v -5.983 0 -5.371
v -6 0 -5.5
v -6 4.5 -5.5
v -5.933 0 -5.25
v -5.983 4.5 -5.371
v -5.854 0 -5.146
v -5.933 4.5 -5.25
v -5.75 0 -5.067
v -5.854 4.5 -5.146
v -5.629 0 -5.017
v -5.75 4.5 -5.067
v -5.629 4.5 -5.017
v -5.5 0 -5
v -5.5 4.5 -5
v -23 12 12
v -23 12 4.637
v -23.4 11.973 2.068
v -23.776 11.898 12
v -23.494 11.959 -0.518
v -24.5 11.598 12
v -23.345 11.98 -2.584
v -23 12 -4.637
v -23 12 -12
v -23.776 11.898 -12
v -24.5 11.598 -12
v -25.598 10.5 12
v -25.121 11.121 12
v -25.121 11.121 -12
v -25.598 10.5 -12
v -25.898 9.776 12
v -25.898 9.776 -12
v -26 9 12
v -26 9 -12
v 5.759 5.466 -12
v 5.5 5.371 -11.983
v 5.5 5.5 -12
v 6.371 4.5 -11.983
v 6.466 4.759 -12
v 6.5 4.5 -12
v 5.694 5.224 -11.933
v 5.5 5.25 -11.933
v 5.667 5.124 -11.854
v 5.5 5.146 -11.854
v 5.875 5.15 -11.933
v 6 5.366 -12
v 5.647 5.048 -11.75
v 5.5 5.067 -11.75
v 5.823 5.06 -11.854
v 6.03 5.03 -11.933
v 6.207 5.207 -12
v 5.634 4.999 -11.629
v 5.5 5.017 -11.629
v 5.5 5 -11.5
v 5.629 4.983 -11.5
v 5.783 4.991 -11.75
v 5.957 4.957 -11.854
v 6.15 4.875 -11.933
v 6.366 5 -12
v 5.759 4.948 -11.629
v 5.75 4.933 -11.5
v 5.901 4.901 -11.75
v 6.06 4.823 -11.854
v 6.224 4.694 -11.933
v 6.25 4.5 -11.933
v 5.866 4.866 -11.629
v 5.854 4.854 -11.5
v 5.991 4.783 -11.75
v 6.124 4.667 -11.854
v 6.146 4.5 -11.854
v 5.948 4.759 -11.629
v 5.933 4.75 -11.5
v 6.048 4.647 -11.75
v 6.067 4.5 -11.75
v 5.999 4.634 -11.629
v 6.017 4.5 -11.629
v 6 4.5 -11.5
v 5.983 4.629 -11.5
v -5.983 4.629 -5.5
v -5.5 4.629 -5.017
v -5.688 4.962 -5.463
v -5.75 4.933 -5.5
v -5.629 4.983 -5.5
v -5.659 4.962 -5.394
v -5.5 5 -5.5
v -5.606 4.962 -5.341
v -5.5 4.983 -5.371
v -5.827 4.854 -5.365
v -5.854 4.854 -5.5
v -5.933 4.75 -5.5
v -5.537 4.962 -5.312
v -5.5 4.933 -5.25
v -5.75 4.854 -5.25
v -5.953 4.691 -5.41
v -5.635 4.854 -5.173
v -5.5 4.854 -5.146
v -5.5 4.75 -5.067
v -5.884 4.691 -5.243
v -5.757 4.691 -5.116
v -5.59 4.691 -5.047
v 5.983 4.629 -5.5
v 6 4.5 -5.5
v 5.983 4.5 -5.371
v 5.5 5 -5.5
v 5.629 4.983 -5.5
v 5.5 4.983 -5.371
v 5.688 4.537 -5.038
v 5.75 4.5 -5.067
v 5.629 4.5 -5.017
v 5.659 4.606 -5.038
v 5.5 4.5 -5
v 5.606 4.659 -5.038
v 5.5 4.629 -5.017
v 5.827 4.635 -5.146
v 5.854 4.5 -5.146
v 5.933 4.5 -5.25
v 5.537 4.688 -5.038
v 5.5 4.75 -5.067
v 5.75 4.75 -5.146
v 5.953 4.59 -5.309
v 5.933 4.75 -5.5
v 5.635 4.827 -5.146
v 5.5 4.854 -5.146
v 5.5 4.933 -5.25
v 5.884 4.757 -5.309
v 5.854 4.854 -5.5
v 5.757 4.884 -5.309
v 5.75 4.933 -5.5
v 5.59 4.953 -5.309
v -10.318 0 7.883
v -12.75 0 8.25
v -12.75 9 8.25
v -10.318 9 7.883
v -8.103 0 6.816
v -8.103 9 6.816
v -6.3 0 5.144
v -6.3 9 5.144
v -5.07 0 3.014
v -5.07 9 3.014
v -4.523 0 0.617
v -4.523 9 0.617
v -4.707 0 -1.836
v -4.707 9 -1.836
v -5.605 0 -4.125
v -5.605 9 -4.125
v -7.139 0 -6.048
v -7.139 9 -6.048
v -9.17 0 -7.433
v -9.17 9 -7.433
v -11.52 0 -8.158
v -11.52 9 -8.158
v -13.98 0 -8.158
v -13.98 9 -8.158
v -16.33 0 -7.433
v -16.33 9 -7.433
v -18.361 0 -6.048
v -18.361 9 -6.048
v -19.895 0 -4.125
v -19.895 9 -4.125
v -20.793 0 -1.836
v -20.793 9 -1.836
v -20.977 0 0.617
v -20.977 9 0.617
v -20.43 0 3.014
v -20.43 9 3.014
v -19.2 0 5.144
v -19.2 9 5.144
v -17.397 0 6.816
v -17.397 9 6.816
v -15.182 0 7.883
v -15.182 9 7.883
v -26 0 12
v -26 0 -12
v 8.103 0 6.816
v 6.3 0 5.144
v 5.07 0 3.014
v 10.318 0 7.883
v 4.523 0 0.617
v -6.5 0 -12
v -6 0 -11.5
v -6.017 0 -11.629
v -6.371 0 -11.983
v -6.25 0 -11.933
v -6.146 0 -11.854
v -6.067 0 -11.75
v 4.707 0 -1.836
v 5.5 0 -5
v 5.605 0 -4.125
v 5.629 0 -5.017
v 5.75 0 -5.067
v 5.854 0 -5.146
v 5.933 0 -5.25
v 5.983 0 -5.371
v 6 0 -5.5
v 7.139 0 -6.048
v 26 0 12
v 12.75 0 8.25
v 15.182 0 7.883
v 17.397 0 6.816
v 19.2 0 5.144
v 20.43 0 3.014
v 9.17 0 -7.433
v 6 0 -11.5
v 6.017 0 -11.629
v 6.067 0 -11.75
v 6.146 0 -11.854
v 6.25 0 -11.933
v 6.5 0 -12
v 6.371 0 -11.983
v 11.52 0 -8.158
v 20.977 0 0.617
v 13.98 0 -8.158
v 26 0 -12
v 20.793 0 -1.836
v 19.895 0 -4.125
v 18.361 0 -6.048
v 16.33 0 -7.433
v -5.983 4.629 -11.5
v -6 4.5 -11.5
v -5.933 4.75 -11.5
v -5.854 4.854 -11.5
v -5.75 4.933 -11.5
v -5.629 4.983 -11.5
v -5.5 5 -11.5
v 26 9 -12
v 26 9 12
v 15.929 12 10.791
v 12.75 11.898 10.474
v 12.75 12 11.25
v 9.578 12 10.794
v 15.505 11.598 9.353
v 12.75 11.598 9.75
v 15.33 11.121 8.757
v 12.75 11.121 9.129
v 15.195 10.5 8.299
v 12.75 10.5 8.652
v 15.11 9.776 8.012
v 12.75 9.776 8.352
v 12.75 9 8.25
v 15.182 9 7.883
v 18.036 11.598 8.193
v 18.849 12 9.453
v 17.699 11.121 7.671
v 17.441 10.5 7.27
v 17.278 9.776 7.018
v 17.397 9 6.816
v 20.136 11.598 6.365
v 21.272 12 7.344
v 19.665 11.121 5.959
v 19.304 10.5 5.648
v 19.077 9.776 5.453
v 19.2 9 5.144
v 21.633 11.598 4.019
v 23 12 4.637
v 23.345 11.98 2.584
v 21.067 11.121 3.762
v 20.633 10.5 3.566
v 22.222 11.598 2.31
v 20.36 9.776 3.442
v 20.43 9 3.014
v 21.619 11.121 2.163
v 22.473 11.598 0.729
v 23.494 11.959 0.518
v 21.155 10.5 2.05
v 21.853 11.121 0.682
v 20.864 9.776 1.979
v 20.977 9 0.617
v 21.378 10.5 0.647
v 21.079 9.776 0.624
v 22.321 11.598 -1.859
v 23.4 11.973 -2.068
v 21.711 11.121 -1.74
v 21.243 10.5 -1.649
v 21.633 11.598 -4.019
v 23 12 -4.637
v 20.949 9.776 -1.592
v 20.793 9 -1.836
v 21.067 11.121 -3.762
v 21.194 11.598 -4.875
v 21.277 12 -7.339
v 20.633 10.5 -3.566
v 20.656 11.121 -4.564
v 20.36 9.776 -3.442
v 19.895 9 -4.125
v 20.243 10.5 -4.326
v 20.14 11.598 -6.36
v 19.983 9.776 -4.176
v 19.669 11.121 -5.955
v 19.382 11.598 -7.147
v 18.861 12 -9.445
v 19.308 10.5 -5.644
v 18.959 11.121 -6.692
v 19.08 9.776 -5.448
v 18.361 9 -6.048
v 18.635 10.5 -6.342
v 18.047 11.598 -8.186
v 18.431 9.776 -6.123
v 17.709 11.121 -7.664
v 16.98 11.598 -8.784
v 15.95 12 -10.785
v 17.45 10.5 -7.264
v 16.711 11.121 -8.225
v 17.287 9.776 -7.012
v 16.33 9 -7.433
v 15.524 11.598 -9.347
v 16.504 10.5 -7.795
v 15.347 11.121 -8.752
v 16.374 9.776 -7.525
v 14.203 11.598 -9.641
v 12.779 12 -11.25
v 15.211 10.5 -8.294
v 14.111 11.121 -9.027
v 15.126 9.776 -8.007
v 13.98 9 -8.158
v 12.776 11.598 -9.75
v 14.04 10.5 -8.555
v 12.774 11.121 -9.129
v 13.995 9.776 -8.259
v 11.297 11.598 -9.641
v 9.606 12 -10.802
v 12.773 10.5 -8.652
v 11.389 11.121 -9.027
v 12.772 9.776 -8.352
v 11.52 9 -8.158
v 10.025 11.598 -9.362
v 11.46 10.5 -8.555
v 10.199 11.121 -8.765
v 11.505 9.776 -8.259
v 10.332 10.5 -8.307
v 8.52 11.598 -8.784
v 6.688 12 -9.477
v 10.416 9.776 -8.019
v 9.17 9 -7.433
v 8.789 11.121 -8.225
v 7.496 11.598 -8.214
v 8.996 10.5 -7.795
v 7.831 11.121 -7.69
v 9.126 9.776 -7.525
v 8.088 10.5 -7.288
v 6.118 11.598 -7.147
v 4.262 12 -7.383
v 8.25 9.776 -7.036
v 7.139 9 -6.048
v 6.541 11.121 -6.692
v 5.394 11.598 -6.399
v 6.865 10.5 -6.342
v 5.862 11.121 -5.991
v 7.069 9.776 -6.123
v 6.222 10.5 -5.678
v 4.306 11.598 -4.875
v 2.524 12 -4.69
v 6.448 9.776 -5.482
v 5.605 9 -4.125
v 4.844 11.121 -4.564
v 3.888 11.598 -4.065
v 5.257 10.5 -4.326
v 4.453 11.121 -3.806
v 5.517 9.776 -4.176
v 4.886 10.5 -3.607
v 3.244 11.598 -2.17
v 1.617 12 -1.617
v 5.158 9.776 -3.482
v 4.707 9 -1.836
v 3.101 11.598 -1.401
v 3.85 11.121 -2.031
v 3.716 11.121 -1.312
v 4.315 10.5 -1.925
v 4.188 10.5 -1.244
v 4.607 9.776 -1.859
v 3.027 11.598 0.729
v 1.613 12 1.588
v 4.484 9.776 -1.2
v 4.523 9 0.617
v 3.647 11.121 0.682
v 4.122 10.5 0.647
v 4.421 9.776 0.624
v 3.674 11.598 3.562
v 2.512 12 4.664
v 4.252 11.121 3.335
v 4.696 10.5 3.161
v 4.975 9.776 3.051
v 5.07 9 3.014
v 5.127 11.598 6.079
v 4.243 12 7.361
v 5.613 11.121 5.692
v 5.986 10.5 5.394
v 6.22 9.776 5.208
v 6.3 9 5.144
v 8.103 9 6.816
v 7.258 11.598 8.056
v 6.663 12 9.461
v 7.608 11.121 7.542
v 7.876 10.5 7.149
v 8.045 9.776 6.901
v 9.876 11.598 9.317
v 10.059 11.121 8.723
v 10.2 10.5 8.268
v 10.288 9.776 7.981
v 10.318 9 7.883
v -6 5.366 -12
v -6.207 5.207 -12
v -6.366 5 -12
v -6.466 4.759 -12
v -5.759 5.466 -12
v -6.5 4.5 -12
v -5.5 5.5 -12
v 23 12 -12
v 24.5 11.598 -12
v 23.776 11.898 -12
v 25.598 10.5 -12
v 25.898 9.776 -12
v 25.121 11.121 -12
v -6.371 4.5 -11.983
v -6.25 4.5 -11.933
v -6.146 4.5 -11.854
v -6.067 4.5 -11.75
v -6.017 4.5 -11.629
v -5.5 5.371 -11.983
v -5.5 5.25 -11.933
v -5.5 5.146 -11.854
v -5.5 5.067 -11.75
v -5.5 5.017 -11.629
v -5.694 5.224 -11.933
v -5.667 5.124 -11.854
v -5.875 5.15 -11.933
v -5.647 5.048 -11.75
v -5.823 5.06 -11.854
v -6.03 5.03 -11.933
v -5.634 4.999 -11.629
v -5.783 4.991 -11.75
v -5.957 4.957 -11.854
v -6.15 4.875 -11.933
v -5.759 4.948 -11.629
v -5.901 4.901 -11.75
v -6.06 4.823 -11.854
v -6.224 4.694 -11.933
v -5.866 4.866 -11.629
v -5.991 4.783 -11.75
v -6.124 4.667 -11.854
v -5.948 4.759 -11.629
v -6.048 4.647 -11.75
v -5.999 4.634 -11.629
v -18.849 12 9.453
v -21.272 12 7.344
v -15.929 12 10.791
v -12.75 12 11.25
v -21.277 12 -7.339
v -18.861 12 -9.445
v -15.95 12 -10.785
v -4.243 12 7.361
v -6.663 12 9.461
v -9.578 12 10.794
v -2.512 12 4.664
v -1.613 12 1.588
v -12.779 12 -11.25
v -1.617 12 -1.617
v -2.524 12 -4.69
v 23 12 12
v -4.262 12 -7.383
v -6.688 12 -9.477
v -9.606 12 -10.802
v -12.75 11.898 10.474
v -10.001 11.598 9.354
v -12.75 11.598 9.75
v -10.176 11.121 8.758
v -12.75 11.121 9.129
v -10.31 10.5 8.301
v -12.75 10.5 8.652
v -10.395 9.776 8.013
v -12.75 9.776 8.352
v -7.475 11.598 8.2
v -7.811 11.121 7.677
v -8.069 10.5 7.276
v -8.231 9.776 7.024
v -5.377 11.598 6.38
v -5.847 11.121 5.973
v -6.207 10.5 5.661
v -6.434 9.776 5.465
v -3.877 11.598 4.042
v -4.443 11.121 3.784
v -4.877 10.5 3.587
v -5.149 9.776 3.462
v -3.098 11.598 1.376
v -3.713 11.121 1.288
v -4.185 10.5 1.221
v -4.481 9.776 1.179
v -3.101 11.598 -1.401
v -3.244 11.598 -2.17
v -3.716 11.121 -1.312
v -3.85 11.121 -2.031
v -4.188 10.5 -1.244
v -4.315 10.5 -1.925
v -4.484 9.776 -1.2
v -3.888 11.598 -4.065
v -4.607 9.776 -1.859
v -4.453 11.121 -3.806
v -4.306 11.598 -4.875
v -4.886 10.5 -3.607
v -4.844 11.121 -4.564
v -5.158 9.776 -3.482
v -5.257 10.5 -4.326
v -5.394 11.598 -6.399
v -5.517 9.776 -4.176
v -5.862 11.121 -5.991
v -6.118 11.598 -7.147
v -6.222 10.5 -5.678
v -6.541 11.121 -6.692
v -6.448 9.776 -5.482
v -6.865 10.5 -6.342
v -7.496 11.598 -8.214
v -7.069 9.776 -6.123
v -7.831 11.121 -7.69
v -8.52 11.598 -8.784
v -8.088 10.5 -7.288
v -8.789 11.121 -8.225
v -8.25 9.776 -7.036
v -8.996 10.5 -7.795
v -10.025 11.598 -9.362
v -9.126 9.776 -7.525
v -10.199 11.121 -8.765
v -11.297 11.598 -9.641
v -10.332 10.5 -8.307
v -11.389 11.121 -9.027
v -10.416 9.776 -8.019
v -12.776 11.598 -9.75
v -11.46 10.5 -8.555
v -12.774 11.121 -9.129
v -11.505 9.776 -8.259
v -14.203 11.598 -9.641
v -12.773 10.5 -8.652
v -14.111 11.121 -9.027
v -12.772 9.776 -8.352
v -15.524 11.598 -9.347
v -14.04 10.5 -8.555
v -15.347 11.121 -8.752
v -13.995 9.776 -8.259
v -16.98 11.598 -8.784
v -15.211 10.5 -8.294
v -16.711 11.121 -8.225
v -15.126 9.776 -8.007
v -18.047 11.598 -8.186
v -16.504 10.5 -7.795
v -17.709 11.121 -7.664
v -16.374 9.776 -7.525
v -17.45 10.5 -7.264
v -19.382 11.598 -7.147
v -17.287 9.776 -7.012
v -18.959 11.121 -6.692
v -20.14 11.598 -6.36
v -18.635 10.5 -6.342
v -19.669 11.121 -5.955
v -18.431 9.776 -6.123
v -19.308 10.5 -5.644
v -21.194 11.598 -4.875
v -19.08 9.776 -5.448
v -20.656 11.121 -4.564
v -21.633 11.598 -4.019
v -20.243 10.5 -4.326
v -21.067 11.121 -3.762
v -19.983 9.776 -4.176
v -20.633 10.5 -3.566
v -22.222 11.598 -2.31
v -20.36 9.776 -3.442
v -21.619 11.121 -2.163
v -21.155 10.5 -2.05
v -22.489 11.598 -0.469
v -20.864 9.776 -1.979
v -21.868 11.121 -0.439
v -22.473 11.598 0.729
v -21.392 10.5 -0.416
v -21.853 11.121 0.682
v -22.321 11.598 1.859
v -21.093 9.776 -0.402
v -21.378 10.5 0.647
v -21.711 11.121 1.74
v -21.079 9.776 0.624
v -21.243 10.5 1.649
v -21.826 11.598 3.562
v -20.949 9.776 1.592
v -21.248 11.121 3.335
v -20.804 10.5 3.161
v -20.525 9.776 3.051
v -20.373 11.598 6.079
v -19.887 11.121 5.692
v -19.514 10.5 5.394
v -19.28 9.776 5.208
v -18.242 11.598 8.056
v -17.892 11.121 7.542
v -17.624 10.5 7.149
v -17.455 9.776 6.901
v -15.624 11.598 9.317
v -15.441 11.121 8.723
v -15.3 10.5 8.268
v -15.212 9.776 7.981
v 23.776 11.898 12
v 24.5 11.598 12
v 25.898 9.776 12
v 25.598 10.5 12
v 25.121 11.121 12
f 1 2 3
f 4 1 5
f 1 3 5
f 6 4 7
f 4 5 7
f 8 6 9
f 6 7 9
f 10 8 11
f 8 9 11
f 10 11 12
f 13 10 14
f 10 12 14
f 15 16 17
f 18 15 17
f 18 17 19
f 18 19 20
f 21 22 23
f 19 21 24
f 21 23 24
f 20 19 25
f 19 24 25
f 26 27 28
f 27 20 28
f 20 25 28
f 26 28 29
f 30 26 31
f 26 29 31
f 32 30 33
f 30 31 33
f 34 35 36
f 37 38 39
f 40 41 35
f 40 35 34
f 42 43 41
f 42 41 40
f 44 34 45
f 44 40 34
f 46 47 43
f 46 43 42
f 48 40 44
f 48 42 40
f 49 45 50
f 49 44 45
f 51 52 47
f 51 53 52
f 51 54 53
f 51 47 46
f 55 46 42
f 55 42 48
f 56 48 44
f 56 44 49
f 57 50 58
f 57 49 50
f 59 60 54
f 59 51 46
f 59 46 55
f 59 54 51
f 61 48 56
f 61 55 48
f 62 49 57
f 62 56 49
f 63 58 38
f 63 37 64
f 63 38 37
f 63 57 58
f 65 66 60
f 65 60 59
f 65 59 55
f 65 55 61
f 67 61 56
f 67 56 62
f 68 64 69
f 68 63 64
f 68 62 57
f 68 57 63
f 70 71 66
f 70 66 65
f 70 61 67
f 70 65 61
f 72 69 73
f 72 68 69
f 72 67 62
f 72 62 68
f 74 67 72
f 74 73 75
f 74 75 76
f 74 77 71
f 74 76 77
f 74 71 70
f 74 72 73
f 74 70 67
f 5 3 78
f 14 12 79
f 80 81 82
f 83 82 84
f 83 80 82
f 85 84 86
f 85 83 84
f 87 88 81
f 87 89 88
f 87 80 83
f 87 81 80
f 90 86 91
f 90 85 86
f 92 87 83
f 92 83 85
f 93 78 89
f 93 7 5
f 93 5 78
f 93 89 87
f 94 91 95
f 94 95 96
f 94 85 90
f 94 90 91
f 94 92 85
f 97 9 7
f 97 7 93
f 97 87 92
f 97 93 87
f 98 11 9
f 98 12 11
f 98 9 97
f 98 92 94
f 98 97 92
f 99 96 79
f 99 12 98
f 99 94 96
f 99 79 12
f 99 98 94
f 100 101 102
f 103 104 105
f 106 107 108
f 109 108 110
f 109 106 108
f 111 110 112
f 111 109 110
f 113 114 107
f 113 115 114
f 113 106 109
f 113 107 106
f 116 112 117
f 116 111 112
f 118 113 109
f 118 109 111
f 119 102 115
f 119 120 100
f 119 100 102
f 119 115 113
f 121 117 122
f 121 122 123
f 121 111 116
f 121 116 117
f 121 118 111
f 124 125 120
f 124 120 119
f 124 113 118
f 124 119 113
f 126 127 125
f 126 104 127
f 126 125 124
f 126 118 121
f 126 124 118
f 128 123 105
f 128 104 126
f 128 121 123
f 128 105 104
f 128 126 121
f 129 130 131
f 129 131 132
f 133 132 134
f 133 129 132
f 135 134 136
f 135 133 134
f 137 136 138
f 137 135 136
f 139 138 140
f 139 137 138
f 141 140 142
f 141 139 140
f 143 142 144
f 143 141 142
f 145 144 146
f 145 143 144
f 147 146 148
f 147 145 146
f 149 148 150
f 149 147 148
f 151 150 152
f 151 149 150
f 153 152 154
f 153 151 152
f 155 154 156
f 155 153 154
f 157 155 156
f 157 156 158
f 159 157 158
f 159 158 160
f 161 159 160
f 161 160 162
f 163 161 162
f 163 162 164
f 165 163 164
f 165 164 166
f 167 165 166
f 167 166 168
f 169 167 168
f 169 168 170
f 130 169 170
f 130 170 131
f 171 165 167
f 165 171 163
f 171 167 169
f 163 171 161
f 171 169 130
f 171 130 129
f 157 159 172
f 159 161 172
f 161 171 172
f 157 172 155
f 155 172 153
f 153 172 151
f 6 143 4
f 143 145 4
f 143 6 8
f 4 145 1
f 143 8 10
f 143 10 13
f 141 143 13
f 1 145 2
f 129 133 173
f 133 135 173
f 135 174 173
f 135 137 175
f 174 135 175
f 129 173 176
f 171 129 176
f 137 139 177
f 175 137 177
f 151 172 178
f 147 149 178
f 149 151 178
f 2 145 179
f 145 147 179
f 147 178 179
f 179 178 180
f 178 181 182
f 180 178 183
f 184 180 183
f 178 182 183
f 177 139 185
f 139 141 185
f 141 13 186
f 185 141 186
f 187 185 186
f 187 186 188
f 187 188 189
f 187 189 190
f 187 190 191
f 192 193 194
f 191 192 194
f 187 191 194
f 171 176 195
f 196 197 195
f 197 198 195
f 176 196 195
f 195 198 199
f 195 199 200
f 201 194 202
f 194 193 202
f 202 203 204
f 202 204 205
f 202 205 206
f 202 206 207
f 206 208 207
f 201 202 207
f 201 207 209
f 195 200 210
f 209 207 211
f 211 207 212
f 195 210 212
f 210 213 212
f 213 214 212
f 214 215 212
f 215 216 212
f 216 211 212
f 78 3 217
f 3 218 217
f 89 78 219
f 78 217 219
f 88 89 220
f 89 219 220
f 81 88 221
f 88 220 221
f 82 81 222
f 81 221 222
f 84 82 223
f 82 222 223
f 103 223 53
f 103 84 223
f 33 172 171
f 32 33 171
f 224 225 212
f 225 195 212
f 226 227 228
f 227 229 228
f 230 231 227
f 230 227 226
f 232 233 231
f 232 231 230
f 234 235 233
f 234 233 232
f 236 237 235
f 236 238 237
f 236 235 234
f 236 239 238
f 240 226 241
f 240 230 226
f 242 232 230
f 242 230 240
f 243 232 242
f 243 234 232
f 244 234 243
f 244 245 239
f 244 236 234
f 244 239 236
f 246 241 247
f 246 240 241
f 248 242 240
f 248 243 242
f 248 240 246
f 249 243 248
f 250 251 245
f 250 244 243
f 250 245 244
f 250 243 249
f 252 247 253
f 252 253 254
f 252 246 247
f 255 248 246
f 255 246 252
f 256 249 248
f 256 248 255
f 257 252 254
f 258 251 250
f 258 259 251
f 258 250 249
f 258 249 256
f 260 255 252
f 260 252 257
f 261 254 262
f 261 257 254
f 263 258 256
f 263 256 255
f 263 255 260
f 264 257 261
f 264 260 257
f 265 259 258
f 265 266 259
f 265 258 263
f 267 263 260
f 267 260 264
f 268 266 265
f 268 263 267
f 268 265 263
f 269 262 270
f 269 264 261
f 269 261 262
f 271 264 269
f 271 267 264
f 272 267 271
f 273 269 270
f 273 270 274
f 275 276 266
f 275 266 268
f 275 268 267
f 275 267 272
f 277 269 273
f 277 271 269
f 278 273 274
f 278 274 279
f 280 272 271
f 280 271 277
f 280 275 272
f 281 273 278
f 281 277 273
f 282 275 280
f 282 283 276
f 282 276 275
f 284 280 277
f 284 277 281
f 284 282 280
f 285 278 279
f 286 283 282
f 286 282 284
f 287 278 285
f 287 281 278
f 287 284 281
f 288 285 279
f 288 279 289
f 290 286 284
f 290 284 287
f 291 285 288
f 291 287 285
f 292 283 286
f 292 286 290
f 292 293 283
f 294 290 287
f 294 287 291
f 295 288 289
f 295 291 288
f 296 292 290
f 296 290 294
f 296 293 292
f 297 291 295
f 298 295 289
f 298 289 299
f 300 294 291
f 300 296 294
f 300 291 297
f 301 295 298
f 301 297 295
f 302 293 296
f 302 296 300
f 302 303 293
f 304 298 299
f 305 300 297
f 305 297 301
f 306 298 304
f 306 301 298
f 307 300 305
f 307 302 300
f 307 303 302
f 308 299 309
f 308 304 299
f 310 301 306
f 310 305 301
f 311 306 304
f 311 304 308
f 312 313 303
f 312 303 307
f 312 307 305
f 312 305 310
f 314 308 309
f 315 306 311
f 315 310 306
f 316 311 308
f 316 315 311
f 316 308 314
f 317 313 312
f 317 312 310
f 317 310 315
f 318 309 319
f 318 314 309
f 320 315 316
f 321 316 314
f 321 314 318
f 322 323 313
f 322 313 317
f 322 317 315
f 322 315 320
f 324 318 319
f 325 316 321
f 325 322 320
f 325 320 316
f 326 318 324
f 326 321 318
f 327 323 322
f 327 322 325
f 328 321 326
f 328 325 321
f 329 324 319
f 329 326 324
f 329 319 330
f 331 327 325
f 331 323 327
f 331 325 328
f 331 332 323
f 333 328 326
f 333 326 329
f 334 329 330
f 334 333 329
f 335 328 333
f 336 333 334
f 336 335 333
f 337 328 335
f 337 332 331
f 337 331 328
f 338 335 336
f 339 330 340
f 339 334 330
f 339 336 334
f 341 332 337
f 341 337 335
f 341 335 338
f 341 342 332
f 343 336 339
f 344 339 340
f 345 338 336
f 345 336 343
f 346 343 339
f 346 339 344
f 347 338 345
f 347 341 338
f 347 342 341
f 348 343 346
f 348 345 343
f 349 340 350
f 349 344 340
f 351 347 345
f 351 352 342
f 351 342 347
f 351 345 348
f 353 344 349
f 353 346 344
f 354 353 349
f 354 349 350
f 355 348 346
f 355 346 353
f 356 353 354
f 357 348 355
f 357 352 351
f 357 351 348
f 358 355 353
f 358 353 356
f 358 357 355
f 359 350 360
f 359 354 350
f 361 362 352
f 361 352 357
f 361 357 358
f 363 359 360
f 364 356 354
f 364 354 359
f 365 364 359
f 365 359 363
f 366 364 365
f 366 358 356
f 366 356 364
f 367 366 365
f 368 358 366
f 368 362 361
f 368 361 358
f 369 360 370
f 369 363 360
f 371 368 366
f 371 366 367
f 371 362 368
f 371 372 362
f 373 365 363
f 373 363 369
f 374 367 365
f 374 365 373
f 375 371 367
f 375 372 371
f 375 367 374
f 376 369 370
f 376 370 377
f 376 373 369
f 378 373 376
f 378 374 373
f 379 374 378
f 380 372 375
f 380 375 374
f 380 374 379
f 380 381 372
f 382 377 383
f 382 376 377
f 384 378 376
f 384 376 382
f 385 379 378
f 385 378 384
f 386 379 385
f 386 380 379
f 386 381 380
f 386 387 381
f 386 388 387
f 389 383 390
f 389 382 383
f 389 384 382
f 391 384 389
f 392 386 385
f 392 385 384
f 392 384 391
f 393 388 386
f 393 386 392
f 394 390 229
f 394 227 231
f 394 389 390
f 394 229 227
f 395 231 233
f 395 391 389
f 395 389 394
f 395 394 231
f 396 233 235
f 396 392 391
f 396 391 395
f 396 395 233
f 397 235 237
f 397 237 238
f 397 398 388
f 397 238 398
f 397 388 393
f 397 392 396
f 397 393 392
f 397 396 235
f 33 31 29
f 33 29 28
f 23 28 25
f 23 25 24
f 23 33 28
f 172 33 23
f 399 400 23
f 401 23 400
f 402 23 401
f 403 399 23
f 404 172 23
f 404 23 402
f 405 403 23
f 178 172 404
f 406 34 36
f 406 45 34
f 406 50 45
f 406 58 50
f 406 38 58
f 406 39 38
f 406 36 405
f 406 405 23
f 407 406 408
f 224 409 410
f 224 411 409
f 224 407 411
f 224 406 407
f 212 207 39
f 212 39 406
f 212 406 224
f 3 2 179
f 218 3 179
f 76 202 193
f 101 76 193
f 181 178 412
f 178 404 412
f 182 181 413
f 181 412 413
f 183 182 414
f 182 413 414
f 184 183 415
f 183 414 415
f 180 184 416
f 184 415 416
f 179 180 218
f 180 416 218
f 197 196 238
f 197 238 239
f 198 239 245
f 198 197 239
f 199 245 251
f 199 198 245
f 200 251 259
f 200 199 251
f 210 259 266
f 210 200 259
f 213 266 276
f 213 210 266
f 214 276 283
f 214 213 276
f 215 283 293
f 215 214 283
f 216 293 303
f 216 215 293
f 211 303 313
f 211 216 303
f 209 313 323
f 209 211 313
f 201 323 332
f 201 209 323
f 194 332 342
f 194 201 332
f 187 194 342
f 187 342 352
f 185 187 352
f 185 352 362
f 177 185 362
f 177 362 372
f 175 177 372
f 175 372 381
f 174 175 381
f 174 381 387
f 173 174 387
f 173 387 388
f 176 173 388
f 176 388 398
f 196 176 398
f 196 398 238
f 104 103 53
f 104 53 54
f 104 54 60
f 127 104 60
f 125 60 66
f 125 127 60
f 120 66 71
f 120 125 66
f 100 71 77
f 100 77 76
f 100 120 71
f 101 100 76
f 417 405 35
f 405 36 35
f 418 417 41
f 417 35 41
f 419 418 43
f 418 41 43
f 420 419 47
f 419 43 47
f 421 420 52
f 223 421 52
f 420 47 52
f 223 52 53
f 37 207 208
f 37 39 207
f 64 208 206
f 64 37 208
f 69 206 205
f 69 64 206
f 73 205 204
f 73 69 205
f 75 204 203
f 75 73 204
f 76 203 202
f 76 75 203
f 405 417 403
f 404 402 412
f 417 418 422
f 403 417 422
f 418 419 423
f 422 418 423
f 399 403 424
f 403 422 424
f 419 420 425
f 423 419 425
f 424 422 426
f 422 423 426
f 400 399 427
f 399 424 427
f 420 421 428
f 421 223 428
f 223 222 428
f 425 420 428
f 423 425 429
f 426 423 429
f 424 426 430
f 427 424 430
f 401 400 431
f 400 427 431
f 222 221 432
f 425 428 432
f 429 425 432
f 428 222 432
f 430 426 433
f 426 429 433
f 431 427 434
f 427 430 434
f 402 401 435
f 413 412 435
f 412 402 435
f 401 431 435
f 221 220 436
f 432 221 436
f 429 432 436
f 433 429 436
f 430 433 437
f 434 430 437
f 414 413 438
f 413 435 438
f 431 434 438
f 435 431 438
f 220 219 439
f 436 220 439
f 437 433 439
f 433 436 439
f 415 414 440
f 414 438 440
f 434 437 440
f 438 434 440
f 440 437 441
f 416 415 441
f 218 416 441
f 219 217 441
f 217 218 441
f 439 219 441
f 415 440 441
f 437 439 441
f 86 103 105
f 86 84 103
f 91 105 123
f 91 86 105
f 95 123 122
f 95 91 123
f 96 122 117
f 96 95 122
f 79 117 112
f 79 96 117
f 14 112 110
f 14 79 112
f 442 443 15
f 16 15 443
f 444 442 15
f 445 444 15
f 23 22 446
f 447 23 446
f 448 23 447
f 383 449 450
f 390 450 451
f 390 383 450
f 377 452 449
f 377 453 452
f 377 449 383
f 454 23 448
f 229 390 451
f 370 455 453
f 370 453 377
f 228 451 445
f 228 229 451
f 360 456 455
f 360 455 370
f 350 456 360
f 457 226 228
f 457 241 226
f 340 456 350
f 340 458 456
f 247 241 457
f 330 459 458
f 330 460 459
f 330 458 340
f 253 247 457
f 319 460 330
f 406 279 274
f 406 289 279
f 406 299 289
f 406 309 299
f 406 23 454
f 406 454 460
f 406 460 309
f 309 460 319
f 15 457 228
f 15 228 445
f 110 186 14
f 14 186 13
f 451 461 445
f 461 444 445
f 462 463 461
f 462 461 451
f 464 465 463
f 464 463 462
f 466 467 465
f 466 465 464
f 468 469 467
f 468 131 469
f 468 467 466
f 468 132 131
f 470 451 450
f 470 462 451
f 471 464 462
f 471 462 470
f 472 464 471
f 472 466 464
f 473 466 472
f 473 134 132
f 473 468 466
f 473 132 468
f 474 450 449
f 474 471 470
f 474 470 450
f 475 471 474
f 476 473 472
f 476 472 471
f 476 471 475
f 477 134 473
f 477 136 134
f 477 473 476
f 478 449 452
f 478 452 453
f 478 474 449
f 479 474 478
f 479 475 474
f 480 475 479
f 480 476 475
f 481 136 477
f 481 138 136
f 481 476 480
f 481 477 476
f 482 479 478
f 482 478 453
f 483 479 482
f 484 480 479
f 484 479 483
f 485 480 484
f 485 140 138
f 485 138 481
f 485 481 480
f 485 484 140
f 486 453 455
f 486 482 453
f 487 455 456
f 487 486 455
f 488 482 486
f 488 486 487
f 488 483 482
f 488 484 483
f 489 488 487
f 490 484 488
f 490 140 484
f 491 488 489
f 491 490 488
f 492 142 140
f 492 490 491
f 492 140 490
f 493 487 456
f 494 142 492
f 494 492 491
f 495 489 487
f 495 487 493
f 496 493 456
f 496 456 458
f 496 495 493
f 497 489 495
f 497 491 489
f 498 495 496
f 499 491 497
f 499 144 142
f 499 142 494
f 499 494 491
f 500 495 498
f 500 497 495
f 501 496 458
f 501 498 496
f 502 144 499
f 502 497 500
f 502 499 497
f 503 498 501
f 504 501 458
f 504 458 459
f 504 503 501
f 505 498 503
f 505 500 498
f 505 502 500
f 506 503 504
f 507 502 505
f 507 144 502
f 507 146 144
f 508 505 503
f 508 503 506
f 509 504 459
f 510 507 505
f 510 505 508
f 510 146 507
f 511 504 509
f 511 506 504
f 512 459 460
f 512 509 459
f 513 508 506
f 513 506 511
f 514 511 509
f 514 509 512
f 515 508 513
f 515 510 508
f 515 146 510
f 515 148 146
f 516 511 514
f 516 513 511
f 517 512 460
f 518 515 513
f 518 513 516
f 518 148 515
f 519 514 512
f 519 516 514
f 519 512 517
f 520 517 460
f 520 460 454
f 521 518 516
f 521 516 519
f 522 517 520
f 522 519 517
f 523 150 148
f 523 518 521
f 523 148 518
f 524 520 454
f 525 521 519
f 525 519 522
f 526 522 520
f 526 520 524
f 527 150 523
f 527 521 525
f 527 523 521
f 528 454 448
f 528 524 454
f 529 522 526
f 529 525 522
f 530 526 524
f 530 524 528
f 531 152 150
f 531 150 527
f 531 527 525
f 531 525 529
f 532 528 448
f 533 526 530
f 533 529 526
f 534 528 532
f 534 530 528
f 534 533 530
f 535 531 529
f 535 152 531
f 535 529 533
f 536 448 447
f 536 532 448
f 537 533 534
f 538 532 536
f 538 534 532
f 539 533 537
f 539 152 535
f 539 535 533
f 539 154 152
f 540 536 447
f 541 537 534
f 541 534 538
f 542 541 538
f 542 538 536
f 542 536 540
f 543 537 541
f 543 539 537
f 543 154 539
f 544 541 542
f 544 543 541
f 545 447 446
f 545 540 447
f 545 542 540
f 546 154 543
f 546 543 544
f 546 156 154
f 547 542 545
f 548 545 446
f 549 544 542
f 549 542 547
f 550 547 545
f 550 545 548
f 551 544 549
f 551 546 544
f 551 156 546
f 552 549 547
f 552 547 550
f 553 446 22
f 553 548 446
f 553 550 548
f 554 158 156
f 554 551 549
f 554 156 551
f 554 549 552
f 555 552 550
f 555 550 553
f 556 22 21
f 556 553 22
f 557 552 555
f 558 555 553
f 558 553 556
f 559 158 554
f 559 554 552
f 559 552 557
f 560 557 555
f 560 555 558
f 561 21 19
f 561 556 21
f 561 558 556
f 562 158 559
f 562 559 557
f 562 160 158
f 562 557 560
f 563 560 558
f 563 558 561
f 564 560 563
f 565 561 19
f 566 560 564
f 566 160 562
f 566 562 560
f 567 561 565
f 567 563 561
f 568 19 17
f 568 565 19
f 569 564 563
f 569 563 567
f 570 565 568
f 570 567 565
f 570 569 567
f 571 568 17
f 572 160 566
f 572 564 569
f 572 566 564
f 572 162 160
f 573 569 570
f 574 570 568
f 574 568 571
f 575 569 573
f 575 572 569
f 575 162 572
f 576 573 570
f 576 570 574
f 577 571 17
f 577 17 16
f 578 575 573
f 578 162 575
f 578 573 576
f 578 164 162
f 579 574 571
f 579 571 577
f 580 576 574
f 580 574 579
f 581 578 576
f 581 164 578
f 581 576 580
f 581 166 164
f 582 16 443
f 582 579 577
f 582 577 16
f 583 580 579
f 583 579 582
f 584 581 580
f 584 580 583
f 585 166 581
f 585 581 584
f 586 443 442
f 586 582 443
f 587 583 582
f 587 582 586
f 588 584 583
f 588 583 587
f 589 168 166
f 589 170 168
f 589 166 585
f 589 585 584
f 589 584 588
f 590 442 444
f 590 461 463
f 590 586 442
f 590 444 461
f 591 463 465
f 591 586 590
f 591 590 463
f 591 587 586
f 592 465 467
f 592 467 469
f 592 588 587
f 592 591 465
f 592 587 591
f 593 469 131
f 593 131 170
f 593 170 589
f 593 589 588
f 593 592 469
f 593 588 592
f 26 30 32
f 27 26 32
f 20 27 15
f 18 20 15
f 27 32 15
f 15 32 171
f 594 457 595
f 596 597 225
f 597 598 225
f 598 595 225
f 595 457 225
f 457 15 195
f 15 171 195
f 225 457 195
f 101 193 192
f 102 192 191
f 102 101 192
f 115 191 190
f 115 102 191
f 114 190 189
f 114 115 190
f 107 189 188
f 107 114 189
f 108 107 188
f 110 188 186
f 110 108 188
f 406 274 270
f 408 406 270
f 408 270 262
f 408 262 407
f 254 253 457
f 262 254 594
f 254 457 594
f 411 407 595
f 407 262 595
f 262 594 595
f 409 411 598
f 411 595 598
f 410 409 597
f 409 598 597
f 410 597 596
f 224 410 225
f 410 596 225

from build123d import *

# Parameters (mm, degrees)
SKETCH1_W           = 52
SKETCH1_H           = 24
SKETCH1_R           = 8.25
BOSS_EXTRUDE1_DEPTH = 12
SKETCH2_R           = 1
CUT_EXTRUDE1_DEPTH  = 32.048349393
SKETCH3_R           = 1.75
CUT_EXTRUDE2_DEPTH  = 1
CUT_EXTRUDE3_DEPTH  = 5
FILLET2_R           = 0.5
SKETCH6_W           = 10
SKETCH6_H           = 10
SKETCH6_R           = 2
BOSS_EXTRUDE2_DEPTH = 5
FILLET3_R           = 4.6
FILLET4_R           = 3
SKETCH9_R           = 1.75
BOSS_EXTRUDE3_DEPTH = 12
SKETCH10_W          = 13.41545795
SKETCH10_H          = 24
SKETCH10_W_2        = 15.564044944
CUT_EXTRUDE4_DEPTH  = 39.587562763
FILLET5_R           = 3


with BuildPart() as part:
    # Sketch1 → Boss-Extrude1 (new body)
    with BuildSketch(Plane(origin=(0, 0, 0), x_dir=(1, 0, 0), z_dir=(0, 1, 0))):
        Rectangle(SKETCH1_W, SKETCH1_H)
        with Locations(Location((12.75, 0, 0), (0, 0, 270))):
            Circle(SKETCH1_R, mode=Mode.SUBTRACT)
        with Locations(Location((-12.75, 0, 0), (0, 0, 270))):
            Circle(SKETCH1_R, mode=Mode.SUBTRACT)
    extrude(amount=BOSS_EXTRUDE1_DEPTH)

    # Sketch2 → Cut-Extrude1 (cut, through all)
    with BuildSketch(Plane(origin=(0, 12, 0), x_dir=(1, 0, 0), z_dir=(0, 1, 0))):
        with Locations(Location((-21.35, 8.85, 0), (0, 0, 270))):
            Circle(SKETCH2_R)
        with Locations(Location((21.35, 8.85, 0), (0, 0, 270))):
            Circle(SKETCH2_R)
        with Locations(Location((21.35, -8.85, 0), (0, 0, 270))):
            Circle(SKETCH2_R)
        with Locations(Location((-21.35, -8.85, 0), (0, 0, 270))):
            Circle(SKETCH2_R)
    extrude(amount=-CUT_EXTRUDE1_DEPTH, mode=Mode.SUBTRACT)

    # Sketch3 → Cut-Extrude2 (cut)
    with BuildSketch(Plane(origin=(0, 12, 0), x_dir=(1, 0, 0), z_dir=(0, 1, 0))):
        with Locations(Location((-21.35, 8.85, 0), (0, 0, 270))):
            Circle(SKETCH3_R)
        with Locations(Location((21.35, 8.85, 0), (0, 0, 270))):
            Circle(SKETCH3_R)
        with Locations(Location((21.35, -8.85, 0), (0, 0, 270))):
            Circle(SKETCH3_R)
        with Locations(Location((-21.35, -8.85, 0), (0, 0, 270))):
            Circle(SKETCH3_R)
    extrude(amount=-CUT_EXTRUDE2_DEPTH, mode=Mode.SUBTRACT)

    # Sketch4 → Cut-Extrude3 (cut)
    with BuildSketch(Plane.XZ):
        Polygon((-6, -5), (-6, -12), (6, -12), (6, -5), (0, -5), align=None)
    extrude(amount=-CUT_EXTRUDE3_DEPTH, mode=Mode.SUBTRACT)

    # Fillet2
    fillet2_edges = [part.edges().sort_by_distance(p)[0] for p in [
        (0, 5, -12),
        (6, 2.5, -12),
        (-6, 2.5, -12),
        (-6, 2.5, -5),
        (6, 5, -8.5),
        (6, 2.5, -5),
        (-6, 5, -8.5),
        (0, 5, -5),
    ]]
    fillet(fillet2_edges, radius=FILLET2_R)

    # Sketch6 → Boss-Extrude2 (add)
    # profile 1 of 2: a face of its own
    with BuildSketch(Plane(origin=(0, 12, 0), x_dir=(1, 0, 0), z_dir=(0, 1, 0))):
        with Locations((-31, 0)):
            Rectangle(SKETCH6_W, SKETCH6_H)
        with Locations(Location((-31, 0, 0), (0, 0, 270))):
            Circle(SKETCH6_R, mode=Mode.SUBTRACT)
    # profile 2 of 2: a face of its own
    with BuildSketch(Plane(origin=(0, 12, 0), x_dir=(1, 0, 0), z_dir=(0, 1, 0))):
        with Locations((31, 0)):
            Rectangle(SKETCH6_W, SKETCH6_H)
        with Locations(Location((31, 0, 0), (0, 0, 90))):
            Circle(SKETCH6_R, mode=Mode.SUBTRACT)
    extrude(amount=-BOSS_EXTRUDE2_DEPTH)

    # Fillet3
    fillet3_edges = [part.edges().sort_by_distance(p)[0] for p in [
        (-26, 9.5, -5),
        (-26, 9.5, 5),
        (26, 9.5, -5),
        (26, 9.5, 5),
    ]]
    fillet(fillet3_edges, radius=FILLET3_R)

    # Fillet4
    fillet4_edges = [part.edges().sort_by_distance(p)[0] for p in [
        (-36, 9.5, 5),
        (-36, 9.5, -5),
        (36, 9.5, -5),
        (36, 9.5, 5),
    ]]
    fillet(fillet4_edges, radius=FILLET4_R)

    # Sketch9 → Boss-Extrude3 (add)
    with BuildSketch(Plane(origin=(0, 12, 0), x_dir=(1, 0, 0), z_dir=(0, 1, 0))):
        with Locations((-21.35, -8.85)):
            Circle(SKETCH9_R)
        with Locations((21.35, -8.85)):
            Circle(SKETCH9_R)
        with Locations((21.35, 8.85)):
            Circle(SKETCH9_R)
        with Locations((-21.35, 8.85)):
            Circle(SKETCH9_R)
    extrude(amount=-BOSS_EXTRUDE3_DEPTH)

    # Sketch10 → Cut-Extrude4 (cut, through all)
    with BuildSketch(Plane.XZ.offset(-7)):
        with Locations((-32.707728975, 0)):
            Rectangle(SKETCH10_W, SKETCH10_H)
        with Locations((33.782022472, 0)):
            Rectangle(SKETCH10_W_2, SKETCH10_H)
    extrude(amount=-CUT_EXTRUDE4_DEPTH, mode=Mode.SUBTRACT)

    # Fillet5
    # the kernel refuses this fillet: 3 mm, written as the material it takes off along each edge
    with BuildSketch(Plane(origin=(-26, 12, -19.5), x_dir=(1, 0, 0), z_dir=(0, 0, 1)), Plane(origin=(26, 12, 19.5), x_dir=(-1, 0, 0), z_dir=(0, 0, -1))) as fillet5_piece_1:
        with BuildLine():
            CenterArc((FILLET5_R, -FILLET5_R), FILLET5_R, 90, 90)
            Line((0, -FILLET5_R), (0, 0))
            Line((0, 0), (FILLET5_R, 0))
        make_face()
    extrude(amount=39, mode=Mode.SUBTRACT)
    with BuildSketch(Plane(origin=(12.75, 12, 0), x_dir=(0, 0, 1), z_dir=(-1, 0, 0))) as fillet5_piece_2:
        with BuildLine():
            CenterArc((8.25 + FILLET5_R, -FILLET5_R), FILLET5_R, 90, 90)
            Line((8.25, -FILLET5_R), (8.25, 0))
            Line((8.25, 0), (8.25 + FILLET5_R, 0))
        make_face()
    revolve(axis=Axis((12.75, 12, 0), (0, 1, 0)), mode=Mode.SUBTRACT)
    with BuildSketch(Plane(origin=(-12.75, 12, 0), x_dir=(0, 0, 1), z_dir=(-1, 0, 0))) as fillet5_piece_3:
        with BuildLine():
            CenterArc((8.25 + FILLET5_R, -FILLET5_R), FILLET5_R, 90, 90)
            Line((8.25, -FILLET5_R), (8.25, 0))
            Line((8.25, 0), (8.25 + FILLET5_R, 0))
        make_face()
    revolve(axis=Axis((-12.75, 12, 0), (0, 1, 0)), mode=Mode.SUBTRACT)


solid = part.part
